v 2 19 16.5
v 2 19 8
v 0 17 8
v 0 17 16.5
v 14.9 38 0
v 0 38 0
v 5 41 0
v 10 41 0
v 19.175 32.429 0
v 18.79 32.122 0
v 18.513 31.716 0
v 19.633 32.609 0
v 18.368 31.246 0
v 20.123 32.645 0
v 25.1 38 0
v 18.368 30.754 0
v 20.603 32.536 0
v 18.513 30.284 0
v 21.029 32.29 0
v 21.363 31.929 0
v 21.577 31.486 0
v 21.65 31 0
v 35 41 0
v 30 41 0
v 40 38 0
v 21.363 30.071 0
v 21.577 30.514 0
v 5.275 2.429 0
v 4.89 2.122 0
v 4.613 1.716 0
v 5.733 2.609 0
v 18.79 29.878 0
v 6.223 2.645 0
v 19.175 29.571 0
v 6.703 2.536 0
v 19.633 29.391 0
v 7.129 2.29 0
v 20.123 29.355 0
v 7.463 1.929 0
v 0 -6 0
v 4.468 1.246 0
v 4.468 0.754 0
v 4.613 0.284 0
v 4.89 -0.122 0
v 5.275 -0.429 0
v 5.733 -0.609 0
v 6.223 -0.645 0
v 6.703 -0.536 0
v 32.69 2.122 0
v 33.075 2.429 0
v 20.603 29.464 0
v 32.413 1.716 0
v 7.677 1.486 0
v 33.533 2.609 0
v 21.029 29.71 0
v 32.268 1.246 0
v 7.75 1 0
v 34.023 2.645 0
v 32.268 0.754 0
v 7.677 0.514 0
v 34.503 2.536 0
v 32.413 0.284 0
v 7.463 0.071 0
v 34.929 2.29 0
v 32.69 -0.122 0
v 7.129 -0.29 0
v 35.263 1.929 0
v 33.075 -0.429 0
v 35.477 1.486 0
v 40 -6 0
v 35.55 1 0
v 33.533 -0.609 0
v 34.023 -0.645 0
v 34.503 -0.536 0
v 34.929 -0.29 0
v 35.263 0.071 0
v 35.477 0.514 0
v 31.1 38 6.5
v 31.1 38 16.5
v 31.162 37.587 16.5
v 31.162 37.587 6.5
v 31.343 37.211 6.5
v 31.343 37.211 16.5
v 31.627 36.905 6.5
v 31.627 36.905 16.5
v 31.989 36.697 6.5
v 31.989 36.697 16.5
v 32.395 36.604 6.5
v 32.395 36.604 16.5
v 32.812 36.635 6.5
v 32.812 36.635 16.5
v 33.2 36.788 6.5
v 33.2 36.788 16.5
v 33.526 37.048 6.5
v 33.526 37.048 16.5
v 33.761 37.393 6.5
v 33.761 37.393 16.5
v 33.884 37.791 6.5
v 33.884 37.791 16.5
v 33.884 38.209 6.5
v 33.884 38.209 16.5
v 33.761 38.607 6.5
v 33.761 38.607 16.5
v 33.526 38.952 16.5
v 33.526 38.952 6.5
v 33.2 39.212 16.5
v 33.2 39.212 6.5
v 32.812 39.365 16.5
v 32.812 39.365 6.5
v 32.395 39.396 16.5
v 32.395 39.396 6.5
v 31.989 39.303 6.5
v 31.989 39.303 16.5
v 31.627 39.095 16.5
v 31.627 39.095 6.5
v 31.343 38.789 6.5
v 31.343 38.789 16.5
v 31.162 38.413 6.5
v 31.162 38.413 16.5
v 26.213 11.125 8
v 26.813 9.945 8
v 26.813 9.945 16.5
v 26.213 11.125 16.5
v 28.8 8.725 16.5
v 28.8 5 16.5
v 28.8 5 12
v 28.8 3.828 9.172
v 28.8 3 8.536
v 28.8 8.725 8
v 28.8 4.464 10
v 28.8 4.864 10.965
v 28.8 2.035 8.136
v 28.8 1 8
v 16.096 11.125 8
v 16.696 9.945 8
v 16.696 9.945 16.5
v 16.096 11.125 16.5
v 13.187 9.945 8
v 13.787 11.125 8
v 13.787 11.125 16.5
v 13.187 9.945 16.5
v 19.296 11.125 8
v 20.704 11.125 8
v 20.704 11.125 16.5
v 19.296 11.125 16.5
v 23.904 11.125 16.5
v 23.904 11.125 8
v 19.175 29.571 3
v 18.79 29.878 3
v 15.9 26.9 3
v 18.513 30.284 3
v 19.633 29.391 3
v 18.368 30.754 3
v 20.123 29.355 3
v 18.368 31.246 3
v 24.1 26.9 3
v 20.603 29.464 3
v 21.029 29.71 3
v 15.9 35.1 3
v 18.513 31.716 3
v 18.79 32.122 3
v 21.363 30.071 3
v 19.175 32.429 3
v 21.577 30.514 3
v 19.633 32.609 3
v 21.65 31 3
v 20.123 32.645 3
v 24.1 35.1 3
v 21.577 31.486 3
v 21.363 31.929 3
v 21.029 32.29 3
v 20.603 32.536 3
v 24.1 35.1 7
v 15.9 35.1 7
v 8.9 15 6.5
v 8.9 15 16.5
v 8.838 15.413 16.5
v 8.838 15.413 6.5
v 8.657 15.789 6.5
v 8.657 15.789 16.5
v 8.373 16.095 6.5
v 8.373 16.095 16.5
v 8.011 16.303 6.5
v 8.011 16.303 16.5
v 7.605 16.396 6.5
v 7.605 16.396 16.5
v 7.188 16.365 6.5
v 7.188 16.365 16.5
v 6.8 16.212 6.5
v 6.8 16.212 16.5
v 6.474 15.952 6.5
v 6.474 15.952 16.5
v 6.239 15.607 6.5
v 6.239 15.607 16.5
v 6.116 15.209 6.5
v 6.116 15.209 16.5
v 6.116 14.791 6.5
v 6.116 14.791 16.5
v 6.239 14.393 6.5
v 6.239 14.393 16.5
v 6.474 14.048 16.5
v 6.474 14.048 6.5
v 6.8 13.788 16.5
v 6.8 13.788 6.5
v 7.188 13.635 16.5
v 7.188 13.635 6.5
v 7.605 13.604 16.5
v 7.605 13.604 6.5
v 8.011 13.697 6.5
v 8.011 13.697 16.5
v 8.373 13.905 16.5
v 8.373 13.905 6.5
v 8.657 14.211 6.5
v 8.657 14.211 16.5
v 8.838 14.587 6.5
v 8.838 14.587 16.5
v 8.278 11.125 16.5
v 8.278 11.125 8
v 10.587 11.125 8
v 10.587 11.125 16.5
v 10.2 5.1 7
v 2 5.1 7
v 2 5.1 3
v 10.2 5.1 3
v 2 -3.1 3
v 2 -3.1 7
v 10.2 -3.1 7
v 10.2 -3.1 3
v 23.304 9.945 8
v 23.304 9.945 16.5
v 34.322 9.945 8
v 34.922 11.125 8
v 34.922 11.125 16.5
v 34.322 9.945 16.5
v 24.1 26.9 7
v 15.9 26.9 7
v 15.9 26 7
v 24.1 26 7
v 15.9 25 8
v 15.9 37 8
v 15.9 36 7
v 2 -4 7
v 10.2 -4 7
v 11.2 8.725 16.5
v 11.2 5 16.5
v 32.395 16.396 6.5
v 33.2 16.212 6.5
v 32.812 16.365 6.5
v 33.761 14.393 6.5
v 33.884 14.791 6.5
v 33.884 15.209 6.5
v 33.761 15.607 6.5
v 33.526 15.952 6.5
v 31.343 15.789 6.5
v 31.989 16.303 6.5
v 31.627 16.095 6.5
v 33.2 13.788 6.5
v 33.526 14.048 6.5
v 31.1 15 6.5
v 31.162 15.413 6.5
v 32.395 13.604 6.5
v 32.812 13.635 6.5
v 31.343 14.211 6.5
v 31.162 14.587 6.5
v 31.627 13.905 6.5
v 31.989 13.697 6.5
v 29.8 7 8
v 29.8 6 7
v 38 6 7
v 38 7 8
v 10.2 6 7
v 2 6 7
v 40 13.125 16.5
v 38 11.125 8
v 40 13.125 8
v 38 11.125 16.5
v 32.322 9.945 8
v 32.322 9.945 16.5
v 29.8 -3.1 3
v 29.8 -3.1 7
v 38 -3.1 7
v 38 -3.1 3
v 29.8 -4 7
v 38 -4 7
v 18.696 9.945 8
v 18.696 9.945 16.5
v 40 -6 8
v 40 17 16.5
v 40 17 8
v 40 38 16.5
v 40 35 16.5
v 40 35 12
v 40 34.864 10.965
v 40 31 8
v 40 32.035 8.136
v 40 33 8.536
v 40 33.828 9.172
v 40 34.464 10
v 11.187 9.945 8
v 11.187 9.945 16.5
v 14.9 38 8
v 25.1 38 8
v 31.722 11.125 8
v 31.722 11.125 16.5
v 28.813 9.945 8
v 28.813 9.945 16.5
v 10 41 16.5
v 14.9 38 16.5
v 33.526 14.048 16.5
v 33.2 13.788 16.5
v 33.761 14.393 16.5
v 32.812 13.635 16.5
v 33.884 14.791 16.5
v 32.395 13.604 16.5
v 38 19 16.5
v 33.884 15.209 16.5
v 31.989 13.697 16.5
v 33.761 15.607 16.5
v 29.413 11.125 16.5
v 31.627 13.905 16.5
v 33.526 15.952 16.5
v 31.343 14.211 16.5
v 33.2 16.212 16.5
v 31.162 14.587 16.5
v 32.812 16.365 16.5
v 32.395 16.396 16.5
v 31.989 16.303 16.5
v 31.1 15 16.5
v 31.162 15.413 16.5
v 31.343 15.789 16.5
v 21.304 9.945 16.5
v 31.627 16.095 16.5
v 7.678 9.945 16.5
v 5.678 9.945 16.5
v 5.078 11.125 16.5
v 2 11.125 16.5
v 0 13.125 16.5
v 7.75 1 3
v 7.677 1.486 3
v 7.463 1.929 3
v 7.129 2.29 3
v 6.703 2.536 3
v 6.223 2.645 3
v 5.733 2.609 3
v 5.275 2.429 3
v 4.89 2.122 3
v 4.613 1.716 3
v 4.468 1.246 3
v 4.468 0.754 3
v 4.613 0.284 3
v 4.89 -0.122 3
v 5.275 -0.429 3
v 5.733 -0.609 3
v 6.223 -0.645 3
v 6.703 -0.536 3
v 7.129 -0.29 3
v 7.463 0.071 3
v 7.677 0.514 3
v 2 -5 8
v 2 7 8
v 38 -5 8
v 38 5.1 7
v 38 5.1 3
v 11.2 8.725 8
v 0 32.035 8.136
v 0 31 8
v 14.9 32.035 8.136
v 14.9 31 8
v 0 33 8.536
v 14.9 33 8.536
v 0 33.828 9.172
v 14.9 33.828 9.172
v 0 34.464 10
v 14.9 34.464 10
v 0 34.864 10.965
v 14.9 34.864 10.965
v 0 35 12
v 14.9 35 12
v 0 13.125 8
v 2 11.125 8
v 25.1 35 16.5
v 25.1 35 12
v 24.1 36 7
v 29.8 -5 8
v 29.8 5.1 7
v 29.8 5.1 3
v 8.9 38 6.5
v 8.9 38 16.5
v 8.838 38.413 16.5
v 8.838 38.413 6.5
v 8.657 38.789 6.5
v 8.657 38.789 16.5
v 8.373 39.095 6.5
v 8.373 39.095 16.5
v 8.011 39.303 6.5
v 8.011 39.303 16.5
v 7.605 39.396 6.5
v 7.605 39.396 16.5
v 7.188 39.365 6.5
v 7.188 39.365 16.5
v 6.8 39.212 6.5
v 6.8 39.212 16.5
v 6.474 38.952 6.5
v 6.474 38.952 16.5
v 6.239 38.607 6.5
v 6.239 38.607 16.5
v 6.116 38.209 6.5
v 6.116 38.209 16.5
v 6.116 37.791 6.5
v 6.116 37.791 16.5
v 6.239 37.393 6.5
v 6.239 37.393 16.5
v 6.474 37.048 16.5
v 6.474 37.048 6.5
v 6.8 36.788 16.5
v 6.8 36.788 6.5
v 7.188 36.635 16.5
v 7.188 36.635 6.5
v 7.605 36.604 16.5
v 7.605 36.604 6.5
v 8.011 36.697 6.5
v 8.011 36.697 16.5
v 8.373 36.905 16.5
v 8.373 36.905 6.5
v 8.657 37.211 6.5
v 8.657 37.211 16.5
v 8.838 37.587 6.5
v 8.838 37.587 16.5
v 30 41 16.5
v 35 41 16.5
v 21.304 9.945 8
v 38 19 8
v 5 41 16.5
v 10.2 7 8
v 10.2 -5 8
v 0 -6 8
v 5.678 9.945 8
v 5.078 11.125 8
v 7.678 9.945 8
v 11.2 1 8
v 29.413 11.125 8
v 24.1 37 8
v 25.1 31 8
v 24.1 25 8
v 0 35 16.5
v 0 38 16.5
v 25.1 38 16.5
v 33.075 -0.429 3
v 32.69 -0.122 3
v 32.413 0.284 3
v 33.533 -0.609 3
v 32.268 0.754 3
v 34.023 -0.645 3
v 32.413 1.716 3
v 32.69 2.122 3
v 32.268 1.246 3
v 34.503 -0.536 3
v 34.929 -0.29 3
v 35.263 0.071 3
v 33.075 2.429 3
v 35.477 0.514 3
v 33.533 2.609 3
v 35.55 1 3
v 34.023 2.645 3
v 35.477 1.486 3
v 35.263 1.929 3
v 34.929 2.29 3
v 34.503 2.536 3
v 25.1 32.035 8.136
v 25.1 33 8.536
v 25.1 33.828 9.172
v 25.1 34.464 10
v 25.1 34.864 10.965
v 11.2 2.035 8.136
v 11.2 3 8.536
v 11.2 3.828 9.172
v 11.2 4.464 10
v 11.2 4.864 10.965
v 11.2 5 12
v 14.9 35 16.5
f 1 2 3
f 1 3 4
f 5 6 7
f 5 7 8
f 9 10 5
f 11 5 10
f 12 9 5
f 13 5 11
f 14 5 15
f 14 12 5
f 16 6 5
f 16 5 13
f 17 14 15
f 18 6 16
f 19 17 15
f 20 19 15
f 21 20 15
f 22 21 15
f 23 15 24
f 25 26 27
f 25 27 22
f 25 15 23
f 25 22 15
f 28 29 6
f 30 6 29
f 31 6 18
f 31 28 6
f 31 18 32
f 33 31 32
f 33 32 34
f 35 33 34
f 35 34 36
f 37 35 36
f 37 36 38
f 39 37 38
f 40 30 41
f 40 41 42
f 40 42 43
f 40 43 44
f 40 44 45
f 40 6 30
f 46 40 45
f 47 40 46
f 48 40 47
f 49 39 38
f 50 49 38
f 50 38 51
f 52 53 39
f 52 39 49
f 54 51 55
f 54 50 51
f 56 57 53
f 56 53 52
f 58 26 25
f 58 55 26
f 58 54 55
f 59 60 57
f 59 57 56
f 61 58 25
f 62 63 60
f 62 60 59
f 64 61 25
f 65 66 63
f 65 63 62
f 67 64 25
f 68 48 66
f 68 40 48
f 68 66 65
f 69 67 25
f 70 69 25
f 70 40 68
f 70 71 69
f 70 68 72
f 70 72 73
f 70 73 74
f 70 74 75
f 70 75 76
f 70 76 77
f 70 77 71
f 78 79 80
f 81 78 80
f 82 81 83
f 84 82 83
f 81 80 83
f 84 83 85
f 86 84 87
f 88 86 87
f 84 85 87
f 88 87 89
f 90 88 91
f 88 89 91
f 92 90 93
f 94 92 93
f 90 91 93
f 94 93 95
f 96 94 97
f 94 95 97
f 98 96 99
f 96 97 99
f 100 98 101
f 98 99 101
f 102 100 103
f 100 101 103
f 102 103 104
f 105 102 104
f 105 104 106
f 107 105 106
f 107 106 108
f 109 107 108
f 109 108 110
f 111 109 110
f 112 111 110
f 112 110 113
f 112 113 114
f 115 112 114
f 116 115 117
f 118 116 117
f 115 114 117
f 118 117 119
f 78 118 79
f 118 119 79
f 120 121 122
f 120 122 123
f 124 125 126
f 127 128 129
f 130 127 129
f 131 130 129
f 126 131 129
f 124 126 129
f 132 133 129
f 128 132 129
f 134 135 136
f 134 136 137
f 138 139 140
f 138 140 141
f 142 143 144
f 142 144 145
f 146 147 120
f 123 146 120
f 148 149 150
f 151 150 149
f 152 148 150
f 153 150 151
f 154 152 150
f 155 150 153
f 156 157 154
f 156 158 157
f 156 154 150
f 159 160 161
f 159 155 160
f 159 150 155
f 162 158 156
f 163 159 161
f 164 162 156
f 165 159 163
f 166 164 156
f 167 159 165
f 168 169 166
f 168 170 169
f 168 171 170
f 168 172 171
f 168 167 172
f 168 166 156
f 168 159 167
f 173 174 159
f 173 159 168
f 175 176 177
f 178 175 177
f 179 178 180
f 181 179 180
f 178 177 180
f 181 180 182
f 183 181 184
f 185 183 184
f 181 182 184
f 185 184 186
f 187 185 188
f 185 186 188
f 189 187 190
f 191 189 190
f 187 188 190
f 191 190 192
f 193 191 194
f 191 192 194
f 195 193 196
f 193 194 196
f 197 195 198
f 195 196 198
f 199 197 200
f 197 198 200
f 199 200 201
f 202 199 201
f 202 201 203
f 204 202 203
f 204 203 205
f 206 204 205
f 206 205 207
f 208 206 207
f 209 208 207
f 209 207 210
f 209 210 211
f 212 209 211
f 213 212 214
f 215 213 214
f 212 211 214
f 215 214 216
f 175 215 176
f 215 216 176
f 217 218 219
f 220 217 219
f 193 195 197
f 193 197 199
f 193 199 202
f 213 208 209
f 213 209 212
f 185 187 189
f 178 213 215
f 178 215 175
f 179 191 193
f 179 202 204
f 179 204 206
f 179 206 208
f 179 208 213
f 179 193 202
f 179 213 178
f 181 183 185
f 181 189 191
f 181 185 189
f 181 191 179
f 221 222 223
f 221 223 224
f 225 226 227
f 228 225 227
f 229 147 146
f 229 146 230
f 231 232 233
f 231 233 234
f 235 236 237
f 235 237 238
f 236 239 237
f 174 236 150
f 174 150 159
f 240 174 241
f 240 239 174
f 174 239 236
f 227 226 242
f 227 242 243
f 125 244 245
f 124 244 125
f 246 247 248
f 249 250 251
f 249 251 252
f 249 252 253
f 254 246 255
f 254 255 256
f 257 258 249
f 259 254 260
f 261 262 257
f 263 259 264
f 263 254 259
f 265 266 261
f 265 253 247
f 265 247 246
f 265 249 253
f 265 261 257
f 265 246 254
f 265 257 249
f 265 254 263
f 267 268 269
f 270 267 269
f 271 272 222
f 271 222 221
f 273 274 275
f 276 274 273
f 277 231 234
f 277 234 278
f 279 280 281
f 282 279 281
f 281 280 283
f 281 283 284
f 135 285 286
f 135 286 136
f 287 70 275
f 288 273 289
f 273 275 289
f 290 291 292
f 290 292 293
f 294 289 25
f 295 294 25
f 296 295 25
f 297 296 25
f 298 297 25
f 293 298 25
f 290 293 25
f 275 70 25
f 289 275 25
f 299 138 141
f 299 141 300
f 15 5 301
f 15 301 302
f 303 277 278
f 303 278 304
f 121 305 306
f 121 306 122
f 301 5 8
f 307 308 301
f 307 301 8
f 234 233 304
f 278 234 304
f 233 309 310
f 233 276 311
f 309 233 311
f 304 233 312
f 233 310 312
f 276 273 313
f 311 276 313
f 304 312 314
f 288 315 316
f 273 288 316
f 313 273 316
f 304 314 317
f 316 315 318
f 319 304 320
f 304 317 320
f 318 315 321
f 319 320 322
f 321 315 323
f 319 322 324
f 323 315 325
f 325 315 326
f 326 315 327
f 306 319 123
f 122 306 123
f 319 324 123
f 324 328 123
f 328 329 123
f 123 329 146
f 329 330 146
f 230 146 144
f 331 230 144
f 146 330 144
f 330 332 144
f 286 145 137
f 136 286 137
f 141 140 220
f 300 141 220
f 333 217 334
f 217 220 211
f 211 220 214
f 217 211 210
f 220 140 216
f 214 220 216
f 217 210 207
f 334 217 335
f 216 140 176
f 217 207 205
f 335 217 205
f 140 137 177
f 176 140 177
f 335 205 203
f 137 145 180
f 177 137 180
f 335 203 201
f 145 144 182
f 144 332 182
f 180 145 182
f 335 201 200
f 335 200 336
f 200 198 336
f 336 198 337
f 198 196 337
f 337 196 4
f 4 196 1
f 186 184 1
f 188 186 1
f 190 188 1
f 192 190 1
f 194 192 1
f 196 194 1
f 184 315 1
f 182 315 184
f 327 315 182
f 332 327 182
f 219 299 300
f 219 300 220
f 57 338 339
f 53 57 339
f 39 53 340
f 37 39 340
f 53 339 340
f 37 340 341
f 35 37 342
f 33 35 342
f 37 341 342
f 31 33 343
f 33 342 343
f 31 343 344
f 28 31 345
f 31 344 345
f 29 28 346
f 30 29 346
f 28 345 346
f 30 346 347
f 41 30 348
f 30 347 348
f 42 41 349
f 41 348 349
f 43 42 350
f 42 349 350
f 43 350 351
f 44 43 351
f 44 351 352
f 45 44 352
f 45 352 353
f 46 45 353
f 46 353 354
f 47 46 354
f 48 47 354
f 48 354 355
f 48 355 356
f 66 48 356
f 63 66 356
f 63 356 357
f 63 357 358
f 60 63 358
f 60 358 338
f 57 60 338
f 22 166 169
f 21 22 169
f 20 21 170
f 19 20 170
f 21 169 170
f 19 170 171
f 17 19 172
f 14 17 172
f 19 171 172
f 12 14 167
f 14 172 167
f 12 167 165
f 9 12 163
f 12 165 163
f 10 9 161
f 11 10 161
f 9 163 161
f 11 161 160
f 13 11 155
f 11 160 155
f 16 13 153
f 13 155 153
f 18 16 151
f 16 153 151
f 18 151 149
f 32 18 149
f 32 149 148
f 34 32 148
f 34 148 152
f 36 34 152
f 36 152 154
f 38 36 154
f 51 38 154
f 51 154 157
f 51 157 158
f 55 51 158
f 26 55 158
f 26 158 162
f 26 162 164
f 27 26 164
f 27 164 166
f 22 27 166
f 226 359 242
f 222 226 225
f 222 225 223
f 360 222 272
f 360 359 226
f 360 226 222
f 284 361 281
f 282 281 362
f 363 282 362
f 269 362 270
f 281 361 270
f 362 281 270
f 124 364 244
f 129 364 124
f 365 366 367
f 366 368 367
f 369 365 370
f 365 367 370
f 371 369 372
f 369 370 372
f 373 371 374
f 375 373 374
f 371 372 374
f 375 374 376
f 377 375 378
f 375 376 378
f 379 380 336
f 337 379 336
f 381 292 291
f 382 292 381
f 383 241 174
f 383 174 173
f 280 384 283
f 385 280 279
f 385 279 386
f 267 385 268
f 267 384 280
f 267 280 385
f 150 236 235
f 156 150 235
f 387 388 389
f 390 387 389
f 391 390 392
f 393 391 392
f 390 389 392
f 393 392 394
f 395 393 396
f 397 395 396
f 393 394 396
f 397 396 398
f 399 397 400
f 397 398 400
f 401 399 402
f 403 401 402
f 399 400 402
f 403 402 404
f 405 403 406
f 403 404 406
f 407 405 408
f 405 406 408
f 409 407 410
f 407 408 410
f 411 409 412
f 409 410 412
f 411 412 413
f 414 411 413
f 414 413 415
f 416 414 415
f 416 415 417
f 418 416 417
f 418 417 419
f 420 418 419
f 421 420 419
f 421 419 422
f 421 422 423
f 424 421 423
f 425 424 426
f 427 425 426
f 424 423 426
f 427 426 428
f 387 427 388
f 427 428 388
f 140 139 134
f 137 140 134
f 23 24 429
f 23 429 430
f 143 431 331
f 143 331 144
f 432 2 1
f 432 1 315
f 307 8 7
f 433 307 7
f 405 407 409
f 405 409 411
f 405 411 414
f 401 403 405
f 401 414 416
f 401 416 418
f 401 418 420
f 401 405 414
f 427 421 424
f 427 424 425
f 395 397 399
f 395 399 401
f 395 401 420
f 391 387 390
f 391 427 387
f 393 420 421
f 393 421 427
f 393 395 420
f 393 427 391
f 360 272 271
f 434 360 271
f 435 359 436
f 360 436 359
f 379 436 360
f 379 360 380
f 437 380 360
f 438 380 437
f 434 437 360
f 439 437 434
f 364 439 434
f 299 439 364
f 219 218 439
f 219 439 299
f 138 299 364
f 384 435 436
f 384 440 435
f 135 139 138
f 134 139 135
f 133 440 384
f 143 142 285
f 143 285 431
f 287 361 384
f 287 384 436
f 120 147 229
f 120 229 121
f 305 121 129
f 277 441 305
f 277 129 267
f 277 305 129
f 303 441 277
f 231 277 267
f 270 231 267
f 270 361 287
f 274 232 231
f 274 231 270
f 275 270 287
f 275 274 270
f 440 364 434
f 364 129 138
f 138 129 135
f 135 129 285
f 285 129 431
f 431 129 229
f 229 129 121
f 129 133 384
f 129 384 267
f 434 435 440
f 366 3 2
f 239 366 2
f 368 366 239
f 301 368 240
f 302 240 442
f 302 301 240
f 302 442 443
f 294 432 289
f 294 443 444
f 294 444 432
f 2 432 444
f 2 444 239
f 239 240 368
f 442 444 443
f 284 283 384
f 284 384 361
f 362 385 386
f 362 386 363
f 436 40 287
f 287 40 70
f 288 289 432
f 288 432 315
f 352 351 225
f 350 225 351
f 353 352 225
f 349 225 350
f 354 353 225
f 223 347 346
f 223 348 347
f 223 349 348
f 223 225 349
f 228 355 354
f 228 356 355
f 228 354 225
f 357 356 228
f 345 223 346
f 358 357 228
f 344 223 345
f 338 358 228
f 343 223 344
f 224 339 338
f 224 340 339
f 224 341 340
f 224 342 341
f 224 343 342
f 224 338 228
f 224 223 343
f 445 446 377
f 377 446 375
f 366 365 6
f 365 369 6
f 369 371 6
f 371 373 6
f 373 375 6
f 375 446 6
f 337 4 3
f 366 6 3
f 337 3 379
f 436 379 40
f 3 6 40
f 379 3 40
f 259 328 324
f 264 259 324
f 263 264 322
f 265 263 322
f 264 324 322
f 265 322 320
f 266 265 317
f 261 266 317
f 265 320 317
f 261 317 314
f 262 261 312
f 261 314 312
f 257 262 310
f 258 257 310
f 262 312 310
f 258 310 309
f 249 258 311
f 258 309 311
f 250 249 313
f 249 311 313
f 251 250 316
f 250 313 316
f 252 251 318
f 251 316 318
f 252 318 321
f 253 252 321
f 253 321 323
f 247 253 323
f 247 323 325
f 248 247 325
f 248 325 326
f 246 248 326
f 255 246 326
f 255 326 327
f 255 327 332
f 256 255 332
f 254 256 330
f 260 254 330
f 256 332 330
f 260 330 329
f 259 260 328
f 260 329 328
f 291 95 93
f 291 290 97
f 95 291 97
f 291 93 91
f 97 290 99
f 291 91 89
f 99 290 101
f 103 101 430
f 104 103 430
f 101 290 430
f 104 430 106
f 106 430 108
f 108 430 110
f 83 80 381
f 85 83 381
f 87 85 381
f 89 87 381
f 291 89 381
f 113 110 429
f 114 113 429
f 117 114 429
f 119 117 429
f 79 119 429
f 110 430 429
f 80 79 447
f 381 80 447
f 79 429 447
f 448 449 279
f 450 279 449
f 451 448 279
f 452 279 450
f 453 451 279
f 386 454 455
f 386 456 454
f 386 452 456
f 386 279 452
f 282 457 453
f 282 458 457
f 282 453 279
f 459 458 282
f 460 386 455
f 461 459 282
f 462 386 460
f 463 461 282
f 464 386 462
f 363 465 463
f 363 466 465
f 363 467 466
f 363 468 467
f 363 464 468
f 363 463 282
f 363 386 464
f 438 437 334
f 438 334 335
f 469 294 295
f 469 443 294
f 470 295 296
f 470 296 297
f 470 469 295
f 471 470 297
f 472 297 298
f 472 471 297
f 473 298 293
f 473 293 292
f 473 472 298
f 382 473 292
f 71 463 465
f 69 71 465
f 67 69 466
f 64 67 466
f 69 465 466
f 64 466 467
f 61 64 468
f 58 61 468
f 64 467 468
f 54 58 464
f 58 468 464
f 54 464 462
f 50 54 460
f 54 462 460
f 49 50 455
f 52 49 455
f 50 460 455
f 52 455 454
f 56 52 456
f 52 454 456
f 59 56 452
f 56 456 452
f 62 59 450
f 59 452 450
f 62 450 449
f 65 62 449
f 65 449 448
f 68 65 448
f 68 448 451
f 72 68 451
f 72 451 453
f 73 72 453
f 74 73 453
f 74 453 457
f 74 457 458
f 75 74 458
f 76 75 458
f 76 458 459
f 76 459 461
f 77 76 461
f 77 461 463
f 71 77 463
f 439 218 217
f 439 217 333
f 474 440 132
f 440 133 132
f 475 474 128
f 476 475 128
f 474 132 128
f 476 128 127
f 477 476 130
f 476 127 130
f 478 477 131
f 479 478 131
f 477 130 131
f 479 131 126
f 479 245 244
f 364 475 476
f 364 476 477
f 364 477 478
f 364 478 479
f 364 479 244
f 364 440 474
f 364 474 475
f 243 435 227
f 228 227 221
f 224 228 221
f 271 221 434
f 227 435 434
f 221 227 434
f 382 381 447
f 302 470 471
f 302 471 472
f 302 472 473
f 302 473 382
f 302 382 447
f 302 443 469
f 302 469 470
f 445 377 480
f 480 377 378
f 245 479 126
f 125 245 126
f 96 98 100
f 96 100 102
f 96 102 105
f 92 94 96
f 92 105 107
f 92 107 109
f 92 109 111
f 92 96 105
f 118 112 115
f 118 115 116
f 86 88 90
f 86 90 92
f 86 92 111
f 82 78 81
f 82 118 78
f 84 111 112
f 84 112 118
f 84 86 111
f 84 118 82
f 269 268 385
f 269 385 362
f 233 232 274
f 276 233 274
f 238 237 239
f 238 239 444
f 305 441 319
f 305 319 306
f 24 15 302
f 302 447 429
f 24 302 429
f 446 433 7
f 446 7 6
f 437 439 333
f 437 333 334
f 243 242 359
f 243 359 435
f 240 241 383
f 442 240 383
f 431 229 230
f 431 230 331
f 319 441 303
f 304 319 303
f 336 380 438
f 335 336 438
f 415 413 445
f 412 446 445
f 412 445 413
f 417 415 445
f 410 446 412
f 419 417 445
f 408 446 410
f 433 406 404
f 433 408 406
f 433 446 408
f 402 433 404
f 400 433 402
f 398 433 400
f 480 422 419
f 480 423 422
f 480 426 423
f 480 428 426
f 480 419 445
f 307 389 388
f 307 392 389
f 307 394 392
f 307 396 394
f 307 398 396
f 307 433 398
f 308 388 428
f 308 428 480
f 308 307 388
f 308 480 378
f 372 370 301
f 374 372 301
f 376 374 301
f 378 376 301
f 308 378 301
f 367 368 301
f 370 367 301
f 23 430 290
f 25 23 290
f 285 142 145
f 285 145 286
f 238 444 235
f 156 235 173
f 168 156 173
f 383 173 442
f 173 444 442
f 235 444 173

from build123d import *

# Parameters (mm, degrees)
SKETCH1_W                       = 40
SKETCH1_H                       = 44
BOSS_EXTRUDE1_DEPTH             = 8
SKETCH2_W                       = 8.2
SKETCH2_H                       = 10
CUT_EXTRUDE1_DEPTH              = 1
SKETCH3_W                       = 8.2
SKETCH3_H                       = 8.2
CUT_EXTRUDE2_DEPTH              = 4
CHAMFER1_SIZE                   = 1
SKETCH4_R                       = 1.65
CUT_EXTRUDE3_DEPTH              = 56.398555938
SKETCH5_W                       = 17.6
SKETCH5_H                       = 3.725
BOSS_EXTRUDE2_DEPTH             = 8.5
BOSS_EXTRUDE2_DIRECTION_2_REACH = 57.749
FILLET1_R                       = 4
SKETCH6_R                       = 1.4
CUT_EXTRUDE4_DEPTH              = 10
CHAMFER2_SIZE                   = 2


with BuildPart() as part:
    # Sketch1 → Boss-Extrude1 (new body)
    with BuildSketch(Plane.XY):
        with Locations((20, 16)):
            Rectangle(SKETCH1_W, SKETCH1_H)
    extrude(amount=BOSS_EXTRUDE1_DEPTH)

    # Sketch2 → Cut-Extrude1 (cut)
    with BuildSketch(Plane.XY.offset(8)):
        with Locations((20, 31)):
            Rectangle(SKETCH2_W, SKETCH2_H)
        with Locations((6.1, 1)):
            Rectangle(SKETCH2_W, SKETCH2_H)
        with Locations((33.9, 1)):
            Rectangle(SKETCH2_W, SKETCH2_H)
    extrude(amount=-CUT_EXTRUDE1_DEPTH, mode=Mode.SUBTRACT)

    # Sketch3 → Cut-Extrude2 (cut)
    with BuildSketch(Plane.XY.offset(7)):
        with Locations((20, 31)):
            Rectangle(SKETCH3_W, SKETCH3_H)
        with Locations((6.1, 1)):
            Rectangle(SKETCH3_W, SKETCH3_H)
        with Locations((33.9, 1)):
            Rectangle(SKETCH3_W, SKETCH3_H)
    extrude(amount=-CUT_EXTRUDE2_DEPTH, mode=Mode.SUBTRACT)

    # Chamfer1
    chamfer1_edges = [part.edges().sort_by_distance(p)[0] for p in [
        (20, 26, 8),
        (20, 36, 8),
        (33.9, -4, 8),
        (33.9, 6, 8),
        (6.1, -4, 8),
        (6.1, 6, 8),
    ]]
    chamfer(chamfer1_edges, length=CHAMFER1_SIZE - 0.0001)  # a hair under: the kernel refuses the full size

    # Sketch4 → Cut-Extrude3 (cut, through all)
    with BuildSketch(Plane.XY.offset(3)):
        with Locations((20, 31)):
            Circle(SKETCH4_R)
        with Locations((6.1, 1)):
            Circle(SKETCH4_R)
        with Locations((33.9, 1)):
            Circle(SKETCH4_R)
    extrude(amount=-CUT_EXTRUDE3_DEPTH, mode=Mode.SUBTRACT)

    # Sketch5 → Boss-Extrude2 (add)
    with BuildSketch(Plane.XY.offset(8)):
        Polygon((20.704347826, 11.125), (19.295652174, 11.125), (18.695652174, 9.944955324), (16.695652174, 9.944955324), (16.095652174, 11.125), (15.195652174, 11.125), (13.786956522, 11.125), (13.186956522, 9.944955324), (11.186956522, 9.944955324), (10.586956522, 11.125), (9.686956522, 11.125), (8.27826087, 11.125), (7.67826087, 9.944955324), (5.67826087, 9.944955324), (5.07826087, 11.125), (4.17826087, 11.125), (0, 11.125), (0, 19), (40, 19), (40, 11.125), (35.82173913, 11.125), (34.92173913, 11.125), (34.32173913, 9.944955324), (32.32173913, 9.944955324), (31.72173913, 11.125), (30.313043478, 11.125), (29.413043478, 11.125), (28.813043478, 9.944955324), (26.813043478, 9.944955324), (26.213043478, 11.125), (24.804347826, 11.125), (23.904347826, 11.125), (23.304347826, 9.944955324), (21.304347826, 9.944955324), align=None)
        with Locations((20, 6.8625)):
            Rectangle(SKETCH5_W, SKETCH5_H)
        Polygon((0, 35), (14.9, 35), (14.9, 38), (10, 41), (5, 41), (0, 38), align=None)
        Polygon((25.1, 38), (30, 41), (35, 41), (40, 38), (40, 35), (25.1, 35), align=None)
    extrude(amount=BOSS_EXTRUDE2_DEPTH)

    # Boss-Extrude2 direction 2: up to this face of the body (flat: up to its plane)
    boss_extrude2_direction_2_end = Plane(part.part.faces().sort_by_distance((20, 16.073973219, 0))[0])
    # Sketch5 → Boss-Extrude2 direction 2 (add, up to the picked face)
    with BuildSketch(Plane.XY.offset(8), mode=Mode.PRIVATE) as boss_extrude2_direction_2_sk1:
        Polygon((20.704347826, 11.125), (19.295652174, 11.125), (18.695652174, 9.944955324), (16.695652174, 9.944955324), (16.095652174, 11.125), (15.195652174, 11.125), (13.786956522, 11.125), (13.186956522, 9.944955324), (11.186956522, 9.944955324), (10.586956522, 11.125), (9.686956522, 11.125), (8.27826087, 11.125), (7.67826087, 9.944955324), (5.67826087, 9.944955324), (5.07826087, 11.125), (4.17826087, 11.125), (0, 11.125), (0, 19), (40, 19), (40, 11.125), (35.82173913, 11.125), (34.92173913, 11.125), (34.32173913, 9.944955324), (32.32173913, 9.944955324), (31.72173913, 11.125), (30.313043478, 11.125), (29.413043478, 11.125), (28.813043478, 9.944955324), (26.813043478, 9.944955324), (26.213043478, 11.125), (24.804347826, 11.125), (23.904347826, 11.125), (23.304347826, 9.944955324), (21.304347826, 9.944955324), align=None)
    boss_extrude2_direction_2_tool1 = split(extrude(boss_extrude2_direction_2_sk1.sketch, amount=-BOSS_EXTRUDE2_DIRECTION_2_REACH, mode=Mode.PRIVATE), bisect_by=boss_extrude2_direction_2_end, keep=Keep.BOTH, mode=Mode.PRIVATE)
    # Sketch5 → Boss-Extrude2 direction 2 (add, up to the picked face)
    with BuildSketch(Plane.XY.offset(8), mode=Mode.PRIVATE) as boss_extrude2_direction_2_sk2:
        with Locations((20, 6.8625)):
            Rectangle(SKETCH5_W, SKETCH5_H)
    boss_extrude2_direction_2_tool2 = split(extrude(boss_extrude2_direction_2_sk2.sketch, amount=-BOSS_EXTRUDE2_DIRECTION_2_REACH, mode=Mode.PRIVATE), bisect_by=boss_extrude2_direction_2_end, keep=Keep.BOTH, mode=Mode.PRIVATE)
    # Sketch5 → Boss-Extrude2 direction 2 (add, up to the picked face)
    with BuildSketch(Plane.XY.offset(8), mode=Mode.PRIVATE) as boss_extrude2_direction_2_sk3:
        Polygon((0, 35), (14.9, 35), (14.9, 38), (10, 41), (5, 41), (0, 38), align=None)
    boss_extrude2_direction_2_tool3 = split(extrude(boss_extrude2_direction_2_sk3.sketch, amount=-BOSS_EXTRUDE2_DIRECTION_2_REACH, mode=Mode.PRIVATE), bisect_by=boss_extrude2_direction_2_end, keep=Keep.BOTH, mode=Mode.PRIVATE)
    # Sketch5 → Boss-Extrude2 direction 2 (add, up to the picked face)
    with BuildSketch(Plane.XY.offset(8), mode=Mode.PRIVATE) as boss_extrude2_direction_2_sk4:
        Polygon((25.1, 38), (30, 41), (35, 41), (40, 38), (40, 35), (25.1, 35), align=None)
    boss_extrude2_direction_2_tool4 = split(extrude(boss_extrude2_direction_2_sk4.sketch, amount=-BOSS_EXTRUDE2_DIRECTION_2_REACH, mode=Mode.PRIVATE), bisect_by=boss_extrude2_direction_2_end, keep=Keep.BOTH, mode=Mode.PRIVATE)
    add(boss_extrude2_direction_2_tool1.solids().sort_by(Axis((20, 14.815025, 8), (0, 0, -1)))[0])
    add(boss_extrude2_direction_2_tool2.solids().sort_by(Axis((20, 6.8625, 8), (0, 0, -1)))[0])
    add(boss_extrude2_direction_2_tool3.solids().sort_by(Axis((7.45835, 37.60161, 8), (0, 0, -1)))[0])
    add(boss_extrude2_direction_2_tool4.solids().sort_by(Axis((32.54165, 37.60161, 8), (0, 0, -1)))[0])

    # Fillet1
    fillet1_edges = [part.edges().sort_by_distance(p)[0] for p in [
        (20, 5, 8),
        (7.45, 35, 8),
        (32.55, 35, 8),
    ]]
    fillet(fillet1_edges, radius=FILLET1_R)

    # Sketch6 → Cut-Extrude4 (cut)
    with BuildSketch(Plane.XY.offset(16.5)):
        with Locations((7.5, 38)):
            Circle(SKETCH6_R)
        with Locations((7.5, 15)):
            Circle(SKETCH6_R)
        with Locations(Location((32.5, 38, 0), (0, 0, 180))):
            Circle(SKETCH6_R)
        with Locations(Location((32.5, 15, 0), (0, 0, 180))):
            Circle(SKETCH6_R)
    extrude(amount=-CUT_EXTRUDE4_DEPTH, mode=Mode.SUBTRACT)

    # Chamfer2
    chamfer2_edges = [part.edges().sort_by_distance(p)[0] for p in [
        (0, 11.125, 12.25),
        (0, 19, 12.25),
        (40, 19, 12.25),
        (40, 11.125, 12.25),
    ]]
    chamfer(chamfer2_edges, length=CHAMFER2_SIZE)


solid = part.part
